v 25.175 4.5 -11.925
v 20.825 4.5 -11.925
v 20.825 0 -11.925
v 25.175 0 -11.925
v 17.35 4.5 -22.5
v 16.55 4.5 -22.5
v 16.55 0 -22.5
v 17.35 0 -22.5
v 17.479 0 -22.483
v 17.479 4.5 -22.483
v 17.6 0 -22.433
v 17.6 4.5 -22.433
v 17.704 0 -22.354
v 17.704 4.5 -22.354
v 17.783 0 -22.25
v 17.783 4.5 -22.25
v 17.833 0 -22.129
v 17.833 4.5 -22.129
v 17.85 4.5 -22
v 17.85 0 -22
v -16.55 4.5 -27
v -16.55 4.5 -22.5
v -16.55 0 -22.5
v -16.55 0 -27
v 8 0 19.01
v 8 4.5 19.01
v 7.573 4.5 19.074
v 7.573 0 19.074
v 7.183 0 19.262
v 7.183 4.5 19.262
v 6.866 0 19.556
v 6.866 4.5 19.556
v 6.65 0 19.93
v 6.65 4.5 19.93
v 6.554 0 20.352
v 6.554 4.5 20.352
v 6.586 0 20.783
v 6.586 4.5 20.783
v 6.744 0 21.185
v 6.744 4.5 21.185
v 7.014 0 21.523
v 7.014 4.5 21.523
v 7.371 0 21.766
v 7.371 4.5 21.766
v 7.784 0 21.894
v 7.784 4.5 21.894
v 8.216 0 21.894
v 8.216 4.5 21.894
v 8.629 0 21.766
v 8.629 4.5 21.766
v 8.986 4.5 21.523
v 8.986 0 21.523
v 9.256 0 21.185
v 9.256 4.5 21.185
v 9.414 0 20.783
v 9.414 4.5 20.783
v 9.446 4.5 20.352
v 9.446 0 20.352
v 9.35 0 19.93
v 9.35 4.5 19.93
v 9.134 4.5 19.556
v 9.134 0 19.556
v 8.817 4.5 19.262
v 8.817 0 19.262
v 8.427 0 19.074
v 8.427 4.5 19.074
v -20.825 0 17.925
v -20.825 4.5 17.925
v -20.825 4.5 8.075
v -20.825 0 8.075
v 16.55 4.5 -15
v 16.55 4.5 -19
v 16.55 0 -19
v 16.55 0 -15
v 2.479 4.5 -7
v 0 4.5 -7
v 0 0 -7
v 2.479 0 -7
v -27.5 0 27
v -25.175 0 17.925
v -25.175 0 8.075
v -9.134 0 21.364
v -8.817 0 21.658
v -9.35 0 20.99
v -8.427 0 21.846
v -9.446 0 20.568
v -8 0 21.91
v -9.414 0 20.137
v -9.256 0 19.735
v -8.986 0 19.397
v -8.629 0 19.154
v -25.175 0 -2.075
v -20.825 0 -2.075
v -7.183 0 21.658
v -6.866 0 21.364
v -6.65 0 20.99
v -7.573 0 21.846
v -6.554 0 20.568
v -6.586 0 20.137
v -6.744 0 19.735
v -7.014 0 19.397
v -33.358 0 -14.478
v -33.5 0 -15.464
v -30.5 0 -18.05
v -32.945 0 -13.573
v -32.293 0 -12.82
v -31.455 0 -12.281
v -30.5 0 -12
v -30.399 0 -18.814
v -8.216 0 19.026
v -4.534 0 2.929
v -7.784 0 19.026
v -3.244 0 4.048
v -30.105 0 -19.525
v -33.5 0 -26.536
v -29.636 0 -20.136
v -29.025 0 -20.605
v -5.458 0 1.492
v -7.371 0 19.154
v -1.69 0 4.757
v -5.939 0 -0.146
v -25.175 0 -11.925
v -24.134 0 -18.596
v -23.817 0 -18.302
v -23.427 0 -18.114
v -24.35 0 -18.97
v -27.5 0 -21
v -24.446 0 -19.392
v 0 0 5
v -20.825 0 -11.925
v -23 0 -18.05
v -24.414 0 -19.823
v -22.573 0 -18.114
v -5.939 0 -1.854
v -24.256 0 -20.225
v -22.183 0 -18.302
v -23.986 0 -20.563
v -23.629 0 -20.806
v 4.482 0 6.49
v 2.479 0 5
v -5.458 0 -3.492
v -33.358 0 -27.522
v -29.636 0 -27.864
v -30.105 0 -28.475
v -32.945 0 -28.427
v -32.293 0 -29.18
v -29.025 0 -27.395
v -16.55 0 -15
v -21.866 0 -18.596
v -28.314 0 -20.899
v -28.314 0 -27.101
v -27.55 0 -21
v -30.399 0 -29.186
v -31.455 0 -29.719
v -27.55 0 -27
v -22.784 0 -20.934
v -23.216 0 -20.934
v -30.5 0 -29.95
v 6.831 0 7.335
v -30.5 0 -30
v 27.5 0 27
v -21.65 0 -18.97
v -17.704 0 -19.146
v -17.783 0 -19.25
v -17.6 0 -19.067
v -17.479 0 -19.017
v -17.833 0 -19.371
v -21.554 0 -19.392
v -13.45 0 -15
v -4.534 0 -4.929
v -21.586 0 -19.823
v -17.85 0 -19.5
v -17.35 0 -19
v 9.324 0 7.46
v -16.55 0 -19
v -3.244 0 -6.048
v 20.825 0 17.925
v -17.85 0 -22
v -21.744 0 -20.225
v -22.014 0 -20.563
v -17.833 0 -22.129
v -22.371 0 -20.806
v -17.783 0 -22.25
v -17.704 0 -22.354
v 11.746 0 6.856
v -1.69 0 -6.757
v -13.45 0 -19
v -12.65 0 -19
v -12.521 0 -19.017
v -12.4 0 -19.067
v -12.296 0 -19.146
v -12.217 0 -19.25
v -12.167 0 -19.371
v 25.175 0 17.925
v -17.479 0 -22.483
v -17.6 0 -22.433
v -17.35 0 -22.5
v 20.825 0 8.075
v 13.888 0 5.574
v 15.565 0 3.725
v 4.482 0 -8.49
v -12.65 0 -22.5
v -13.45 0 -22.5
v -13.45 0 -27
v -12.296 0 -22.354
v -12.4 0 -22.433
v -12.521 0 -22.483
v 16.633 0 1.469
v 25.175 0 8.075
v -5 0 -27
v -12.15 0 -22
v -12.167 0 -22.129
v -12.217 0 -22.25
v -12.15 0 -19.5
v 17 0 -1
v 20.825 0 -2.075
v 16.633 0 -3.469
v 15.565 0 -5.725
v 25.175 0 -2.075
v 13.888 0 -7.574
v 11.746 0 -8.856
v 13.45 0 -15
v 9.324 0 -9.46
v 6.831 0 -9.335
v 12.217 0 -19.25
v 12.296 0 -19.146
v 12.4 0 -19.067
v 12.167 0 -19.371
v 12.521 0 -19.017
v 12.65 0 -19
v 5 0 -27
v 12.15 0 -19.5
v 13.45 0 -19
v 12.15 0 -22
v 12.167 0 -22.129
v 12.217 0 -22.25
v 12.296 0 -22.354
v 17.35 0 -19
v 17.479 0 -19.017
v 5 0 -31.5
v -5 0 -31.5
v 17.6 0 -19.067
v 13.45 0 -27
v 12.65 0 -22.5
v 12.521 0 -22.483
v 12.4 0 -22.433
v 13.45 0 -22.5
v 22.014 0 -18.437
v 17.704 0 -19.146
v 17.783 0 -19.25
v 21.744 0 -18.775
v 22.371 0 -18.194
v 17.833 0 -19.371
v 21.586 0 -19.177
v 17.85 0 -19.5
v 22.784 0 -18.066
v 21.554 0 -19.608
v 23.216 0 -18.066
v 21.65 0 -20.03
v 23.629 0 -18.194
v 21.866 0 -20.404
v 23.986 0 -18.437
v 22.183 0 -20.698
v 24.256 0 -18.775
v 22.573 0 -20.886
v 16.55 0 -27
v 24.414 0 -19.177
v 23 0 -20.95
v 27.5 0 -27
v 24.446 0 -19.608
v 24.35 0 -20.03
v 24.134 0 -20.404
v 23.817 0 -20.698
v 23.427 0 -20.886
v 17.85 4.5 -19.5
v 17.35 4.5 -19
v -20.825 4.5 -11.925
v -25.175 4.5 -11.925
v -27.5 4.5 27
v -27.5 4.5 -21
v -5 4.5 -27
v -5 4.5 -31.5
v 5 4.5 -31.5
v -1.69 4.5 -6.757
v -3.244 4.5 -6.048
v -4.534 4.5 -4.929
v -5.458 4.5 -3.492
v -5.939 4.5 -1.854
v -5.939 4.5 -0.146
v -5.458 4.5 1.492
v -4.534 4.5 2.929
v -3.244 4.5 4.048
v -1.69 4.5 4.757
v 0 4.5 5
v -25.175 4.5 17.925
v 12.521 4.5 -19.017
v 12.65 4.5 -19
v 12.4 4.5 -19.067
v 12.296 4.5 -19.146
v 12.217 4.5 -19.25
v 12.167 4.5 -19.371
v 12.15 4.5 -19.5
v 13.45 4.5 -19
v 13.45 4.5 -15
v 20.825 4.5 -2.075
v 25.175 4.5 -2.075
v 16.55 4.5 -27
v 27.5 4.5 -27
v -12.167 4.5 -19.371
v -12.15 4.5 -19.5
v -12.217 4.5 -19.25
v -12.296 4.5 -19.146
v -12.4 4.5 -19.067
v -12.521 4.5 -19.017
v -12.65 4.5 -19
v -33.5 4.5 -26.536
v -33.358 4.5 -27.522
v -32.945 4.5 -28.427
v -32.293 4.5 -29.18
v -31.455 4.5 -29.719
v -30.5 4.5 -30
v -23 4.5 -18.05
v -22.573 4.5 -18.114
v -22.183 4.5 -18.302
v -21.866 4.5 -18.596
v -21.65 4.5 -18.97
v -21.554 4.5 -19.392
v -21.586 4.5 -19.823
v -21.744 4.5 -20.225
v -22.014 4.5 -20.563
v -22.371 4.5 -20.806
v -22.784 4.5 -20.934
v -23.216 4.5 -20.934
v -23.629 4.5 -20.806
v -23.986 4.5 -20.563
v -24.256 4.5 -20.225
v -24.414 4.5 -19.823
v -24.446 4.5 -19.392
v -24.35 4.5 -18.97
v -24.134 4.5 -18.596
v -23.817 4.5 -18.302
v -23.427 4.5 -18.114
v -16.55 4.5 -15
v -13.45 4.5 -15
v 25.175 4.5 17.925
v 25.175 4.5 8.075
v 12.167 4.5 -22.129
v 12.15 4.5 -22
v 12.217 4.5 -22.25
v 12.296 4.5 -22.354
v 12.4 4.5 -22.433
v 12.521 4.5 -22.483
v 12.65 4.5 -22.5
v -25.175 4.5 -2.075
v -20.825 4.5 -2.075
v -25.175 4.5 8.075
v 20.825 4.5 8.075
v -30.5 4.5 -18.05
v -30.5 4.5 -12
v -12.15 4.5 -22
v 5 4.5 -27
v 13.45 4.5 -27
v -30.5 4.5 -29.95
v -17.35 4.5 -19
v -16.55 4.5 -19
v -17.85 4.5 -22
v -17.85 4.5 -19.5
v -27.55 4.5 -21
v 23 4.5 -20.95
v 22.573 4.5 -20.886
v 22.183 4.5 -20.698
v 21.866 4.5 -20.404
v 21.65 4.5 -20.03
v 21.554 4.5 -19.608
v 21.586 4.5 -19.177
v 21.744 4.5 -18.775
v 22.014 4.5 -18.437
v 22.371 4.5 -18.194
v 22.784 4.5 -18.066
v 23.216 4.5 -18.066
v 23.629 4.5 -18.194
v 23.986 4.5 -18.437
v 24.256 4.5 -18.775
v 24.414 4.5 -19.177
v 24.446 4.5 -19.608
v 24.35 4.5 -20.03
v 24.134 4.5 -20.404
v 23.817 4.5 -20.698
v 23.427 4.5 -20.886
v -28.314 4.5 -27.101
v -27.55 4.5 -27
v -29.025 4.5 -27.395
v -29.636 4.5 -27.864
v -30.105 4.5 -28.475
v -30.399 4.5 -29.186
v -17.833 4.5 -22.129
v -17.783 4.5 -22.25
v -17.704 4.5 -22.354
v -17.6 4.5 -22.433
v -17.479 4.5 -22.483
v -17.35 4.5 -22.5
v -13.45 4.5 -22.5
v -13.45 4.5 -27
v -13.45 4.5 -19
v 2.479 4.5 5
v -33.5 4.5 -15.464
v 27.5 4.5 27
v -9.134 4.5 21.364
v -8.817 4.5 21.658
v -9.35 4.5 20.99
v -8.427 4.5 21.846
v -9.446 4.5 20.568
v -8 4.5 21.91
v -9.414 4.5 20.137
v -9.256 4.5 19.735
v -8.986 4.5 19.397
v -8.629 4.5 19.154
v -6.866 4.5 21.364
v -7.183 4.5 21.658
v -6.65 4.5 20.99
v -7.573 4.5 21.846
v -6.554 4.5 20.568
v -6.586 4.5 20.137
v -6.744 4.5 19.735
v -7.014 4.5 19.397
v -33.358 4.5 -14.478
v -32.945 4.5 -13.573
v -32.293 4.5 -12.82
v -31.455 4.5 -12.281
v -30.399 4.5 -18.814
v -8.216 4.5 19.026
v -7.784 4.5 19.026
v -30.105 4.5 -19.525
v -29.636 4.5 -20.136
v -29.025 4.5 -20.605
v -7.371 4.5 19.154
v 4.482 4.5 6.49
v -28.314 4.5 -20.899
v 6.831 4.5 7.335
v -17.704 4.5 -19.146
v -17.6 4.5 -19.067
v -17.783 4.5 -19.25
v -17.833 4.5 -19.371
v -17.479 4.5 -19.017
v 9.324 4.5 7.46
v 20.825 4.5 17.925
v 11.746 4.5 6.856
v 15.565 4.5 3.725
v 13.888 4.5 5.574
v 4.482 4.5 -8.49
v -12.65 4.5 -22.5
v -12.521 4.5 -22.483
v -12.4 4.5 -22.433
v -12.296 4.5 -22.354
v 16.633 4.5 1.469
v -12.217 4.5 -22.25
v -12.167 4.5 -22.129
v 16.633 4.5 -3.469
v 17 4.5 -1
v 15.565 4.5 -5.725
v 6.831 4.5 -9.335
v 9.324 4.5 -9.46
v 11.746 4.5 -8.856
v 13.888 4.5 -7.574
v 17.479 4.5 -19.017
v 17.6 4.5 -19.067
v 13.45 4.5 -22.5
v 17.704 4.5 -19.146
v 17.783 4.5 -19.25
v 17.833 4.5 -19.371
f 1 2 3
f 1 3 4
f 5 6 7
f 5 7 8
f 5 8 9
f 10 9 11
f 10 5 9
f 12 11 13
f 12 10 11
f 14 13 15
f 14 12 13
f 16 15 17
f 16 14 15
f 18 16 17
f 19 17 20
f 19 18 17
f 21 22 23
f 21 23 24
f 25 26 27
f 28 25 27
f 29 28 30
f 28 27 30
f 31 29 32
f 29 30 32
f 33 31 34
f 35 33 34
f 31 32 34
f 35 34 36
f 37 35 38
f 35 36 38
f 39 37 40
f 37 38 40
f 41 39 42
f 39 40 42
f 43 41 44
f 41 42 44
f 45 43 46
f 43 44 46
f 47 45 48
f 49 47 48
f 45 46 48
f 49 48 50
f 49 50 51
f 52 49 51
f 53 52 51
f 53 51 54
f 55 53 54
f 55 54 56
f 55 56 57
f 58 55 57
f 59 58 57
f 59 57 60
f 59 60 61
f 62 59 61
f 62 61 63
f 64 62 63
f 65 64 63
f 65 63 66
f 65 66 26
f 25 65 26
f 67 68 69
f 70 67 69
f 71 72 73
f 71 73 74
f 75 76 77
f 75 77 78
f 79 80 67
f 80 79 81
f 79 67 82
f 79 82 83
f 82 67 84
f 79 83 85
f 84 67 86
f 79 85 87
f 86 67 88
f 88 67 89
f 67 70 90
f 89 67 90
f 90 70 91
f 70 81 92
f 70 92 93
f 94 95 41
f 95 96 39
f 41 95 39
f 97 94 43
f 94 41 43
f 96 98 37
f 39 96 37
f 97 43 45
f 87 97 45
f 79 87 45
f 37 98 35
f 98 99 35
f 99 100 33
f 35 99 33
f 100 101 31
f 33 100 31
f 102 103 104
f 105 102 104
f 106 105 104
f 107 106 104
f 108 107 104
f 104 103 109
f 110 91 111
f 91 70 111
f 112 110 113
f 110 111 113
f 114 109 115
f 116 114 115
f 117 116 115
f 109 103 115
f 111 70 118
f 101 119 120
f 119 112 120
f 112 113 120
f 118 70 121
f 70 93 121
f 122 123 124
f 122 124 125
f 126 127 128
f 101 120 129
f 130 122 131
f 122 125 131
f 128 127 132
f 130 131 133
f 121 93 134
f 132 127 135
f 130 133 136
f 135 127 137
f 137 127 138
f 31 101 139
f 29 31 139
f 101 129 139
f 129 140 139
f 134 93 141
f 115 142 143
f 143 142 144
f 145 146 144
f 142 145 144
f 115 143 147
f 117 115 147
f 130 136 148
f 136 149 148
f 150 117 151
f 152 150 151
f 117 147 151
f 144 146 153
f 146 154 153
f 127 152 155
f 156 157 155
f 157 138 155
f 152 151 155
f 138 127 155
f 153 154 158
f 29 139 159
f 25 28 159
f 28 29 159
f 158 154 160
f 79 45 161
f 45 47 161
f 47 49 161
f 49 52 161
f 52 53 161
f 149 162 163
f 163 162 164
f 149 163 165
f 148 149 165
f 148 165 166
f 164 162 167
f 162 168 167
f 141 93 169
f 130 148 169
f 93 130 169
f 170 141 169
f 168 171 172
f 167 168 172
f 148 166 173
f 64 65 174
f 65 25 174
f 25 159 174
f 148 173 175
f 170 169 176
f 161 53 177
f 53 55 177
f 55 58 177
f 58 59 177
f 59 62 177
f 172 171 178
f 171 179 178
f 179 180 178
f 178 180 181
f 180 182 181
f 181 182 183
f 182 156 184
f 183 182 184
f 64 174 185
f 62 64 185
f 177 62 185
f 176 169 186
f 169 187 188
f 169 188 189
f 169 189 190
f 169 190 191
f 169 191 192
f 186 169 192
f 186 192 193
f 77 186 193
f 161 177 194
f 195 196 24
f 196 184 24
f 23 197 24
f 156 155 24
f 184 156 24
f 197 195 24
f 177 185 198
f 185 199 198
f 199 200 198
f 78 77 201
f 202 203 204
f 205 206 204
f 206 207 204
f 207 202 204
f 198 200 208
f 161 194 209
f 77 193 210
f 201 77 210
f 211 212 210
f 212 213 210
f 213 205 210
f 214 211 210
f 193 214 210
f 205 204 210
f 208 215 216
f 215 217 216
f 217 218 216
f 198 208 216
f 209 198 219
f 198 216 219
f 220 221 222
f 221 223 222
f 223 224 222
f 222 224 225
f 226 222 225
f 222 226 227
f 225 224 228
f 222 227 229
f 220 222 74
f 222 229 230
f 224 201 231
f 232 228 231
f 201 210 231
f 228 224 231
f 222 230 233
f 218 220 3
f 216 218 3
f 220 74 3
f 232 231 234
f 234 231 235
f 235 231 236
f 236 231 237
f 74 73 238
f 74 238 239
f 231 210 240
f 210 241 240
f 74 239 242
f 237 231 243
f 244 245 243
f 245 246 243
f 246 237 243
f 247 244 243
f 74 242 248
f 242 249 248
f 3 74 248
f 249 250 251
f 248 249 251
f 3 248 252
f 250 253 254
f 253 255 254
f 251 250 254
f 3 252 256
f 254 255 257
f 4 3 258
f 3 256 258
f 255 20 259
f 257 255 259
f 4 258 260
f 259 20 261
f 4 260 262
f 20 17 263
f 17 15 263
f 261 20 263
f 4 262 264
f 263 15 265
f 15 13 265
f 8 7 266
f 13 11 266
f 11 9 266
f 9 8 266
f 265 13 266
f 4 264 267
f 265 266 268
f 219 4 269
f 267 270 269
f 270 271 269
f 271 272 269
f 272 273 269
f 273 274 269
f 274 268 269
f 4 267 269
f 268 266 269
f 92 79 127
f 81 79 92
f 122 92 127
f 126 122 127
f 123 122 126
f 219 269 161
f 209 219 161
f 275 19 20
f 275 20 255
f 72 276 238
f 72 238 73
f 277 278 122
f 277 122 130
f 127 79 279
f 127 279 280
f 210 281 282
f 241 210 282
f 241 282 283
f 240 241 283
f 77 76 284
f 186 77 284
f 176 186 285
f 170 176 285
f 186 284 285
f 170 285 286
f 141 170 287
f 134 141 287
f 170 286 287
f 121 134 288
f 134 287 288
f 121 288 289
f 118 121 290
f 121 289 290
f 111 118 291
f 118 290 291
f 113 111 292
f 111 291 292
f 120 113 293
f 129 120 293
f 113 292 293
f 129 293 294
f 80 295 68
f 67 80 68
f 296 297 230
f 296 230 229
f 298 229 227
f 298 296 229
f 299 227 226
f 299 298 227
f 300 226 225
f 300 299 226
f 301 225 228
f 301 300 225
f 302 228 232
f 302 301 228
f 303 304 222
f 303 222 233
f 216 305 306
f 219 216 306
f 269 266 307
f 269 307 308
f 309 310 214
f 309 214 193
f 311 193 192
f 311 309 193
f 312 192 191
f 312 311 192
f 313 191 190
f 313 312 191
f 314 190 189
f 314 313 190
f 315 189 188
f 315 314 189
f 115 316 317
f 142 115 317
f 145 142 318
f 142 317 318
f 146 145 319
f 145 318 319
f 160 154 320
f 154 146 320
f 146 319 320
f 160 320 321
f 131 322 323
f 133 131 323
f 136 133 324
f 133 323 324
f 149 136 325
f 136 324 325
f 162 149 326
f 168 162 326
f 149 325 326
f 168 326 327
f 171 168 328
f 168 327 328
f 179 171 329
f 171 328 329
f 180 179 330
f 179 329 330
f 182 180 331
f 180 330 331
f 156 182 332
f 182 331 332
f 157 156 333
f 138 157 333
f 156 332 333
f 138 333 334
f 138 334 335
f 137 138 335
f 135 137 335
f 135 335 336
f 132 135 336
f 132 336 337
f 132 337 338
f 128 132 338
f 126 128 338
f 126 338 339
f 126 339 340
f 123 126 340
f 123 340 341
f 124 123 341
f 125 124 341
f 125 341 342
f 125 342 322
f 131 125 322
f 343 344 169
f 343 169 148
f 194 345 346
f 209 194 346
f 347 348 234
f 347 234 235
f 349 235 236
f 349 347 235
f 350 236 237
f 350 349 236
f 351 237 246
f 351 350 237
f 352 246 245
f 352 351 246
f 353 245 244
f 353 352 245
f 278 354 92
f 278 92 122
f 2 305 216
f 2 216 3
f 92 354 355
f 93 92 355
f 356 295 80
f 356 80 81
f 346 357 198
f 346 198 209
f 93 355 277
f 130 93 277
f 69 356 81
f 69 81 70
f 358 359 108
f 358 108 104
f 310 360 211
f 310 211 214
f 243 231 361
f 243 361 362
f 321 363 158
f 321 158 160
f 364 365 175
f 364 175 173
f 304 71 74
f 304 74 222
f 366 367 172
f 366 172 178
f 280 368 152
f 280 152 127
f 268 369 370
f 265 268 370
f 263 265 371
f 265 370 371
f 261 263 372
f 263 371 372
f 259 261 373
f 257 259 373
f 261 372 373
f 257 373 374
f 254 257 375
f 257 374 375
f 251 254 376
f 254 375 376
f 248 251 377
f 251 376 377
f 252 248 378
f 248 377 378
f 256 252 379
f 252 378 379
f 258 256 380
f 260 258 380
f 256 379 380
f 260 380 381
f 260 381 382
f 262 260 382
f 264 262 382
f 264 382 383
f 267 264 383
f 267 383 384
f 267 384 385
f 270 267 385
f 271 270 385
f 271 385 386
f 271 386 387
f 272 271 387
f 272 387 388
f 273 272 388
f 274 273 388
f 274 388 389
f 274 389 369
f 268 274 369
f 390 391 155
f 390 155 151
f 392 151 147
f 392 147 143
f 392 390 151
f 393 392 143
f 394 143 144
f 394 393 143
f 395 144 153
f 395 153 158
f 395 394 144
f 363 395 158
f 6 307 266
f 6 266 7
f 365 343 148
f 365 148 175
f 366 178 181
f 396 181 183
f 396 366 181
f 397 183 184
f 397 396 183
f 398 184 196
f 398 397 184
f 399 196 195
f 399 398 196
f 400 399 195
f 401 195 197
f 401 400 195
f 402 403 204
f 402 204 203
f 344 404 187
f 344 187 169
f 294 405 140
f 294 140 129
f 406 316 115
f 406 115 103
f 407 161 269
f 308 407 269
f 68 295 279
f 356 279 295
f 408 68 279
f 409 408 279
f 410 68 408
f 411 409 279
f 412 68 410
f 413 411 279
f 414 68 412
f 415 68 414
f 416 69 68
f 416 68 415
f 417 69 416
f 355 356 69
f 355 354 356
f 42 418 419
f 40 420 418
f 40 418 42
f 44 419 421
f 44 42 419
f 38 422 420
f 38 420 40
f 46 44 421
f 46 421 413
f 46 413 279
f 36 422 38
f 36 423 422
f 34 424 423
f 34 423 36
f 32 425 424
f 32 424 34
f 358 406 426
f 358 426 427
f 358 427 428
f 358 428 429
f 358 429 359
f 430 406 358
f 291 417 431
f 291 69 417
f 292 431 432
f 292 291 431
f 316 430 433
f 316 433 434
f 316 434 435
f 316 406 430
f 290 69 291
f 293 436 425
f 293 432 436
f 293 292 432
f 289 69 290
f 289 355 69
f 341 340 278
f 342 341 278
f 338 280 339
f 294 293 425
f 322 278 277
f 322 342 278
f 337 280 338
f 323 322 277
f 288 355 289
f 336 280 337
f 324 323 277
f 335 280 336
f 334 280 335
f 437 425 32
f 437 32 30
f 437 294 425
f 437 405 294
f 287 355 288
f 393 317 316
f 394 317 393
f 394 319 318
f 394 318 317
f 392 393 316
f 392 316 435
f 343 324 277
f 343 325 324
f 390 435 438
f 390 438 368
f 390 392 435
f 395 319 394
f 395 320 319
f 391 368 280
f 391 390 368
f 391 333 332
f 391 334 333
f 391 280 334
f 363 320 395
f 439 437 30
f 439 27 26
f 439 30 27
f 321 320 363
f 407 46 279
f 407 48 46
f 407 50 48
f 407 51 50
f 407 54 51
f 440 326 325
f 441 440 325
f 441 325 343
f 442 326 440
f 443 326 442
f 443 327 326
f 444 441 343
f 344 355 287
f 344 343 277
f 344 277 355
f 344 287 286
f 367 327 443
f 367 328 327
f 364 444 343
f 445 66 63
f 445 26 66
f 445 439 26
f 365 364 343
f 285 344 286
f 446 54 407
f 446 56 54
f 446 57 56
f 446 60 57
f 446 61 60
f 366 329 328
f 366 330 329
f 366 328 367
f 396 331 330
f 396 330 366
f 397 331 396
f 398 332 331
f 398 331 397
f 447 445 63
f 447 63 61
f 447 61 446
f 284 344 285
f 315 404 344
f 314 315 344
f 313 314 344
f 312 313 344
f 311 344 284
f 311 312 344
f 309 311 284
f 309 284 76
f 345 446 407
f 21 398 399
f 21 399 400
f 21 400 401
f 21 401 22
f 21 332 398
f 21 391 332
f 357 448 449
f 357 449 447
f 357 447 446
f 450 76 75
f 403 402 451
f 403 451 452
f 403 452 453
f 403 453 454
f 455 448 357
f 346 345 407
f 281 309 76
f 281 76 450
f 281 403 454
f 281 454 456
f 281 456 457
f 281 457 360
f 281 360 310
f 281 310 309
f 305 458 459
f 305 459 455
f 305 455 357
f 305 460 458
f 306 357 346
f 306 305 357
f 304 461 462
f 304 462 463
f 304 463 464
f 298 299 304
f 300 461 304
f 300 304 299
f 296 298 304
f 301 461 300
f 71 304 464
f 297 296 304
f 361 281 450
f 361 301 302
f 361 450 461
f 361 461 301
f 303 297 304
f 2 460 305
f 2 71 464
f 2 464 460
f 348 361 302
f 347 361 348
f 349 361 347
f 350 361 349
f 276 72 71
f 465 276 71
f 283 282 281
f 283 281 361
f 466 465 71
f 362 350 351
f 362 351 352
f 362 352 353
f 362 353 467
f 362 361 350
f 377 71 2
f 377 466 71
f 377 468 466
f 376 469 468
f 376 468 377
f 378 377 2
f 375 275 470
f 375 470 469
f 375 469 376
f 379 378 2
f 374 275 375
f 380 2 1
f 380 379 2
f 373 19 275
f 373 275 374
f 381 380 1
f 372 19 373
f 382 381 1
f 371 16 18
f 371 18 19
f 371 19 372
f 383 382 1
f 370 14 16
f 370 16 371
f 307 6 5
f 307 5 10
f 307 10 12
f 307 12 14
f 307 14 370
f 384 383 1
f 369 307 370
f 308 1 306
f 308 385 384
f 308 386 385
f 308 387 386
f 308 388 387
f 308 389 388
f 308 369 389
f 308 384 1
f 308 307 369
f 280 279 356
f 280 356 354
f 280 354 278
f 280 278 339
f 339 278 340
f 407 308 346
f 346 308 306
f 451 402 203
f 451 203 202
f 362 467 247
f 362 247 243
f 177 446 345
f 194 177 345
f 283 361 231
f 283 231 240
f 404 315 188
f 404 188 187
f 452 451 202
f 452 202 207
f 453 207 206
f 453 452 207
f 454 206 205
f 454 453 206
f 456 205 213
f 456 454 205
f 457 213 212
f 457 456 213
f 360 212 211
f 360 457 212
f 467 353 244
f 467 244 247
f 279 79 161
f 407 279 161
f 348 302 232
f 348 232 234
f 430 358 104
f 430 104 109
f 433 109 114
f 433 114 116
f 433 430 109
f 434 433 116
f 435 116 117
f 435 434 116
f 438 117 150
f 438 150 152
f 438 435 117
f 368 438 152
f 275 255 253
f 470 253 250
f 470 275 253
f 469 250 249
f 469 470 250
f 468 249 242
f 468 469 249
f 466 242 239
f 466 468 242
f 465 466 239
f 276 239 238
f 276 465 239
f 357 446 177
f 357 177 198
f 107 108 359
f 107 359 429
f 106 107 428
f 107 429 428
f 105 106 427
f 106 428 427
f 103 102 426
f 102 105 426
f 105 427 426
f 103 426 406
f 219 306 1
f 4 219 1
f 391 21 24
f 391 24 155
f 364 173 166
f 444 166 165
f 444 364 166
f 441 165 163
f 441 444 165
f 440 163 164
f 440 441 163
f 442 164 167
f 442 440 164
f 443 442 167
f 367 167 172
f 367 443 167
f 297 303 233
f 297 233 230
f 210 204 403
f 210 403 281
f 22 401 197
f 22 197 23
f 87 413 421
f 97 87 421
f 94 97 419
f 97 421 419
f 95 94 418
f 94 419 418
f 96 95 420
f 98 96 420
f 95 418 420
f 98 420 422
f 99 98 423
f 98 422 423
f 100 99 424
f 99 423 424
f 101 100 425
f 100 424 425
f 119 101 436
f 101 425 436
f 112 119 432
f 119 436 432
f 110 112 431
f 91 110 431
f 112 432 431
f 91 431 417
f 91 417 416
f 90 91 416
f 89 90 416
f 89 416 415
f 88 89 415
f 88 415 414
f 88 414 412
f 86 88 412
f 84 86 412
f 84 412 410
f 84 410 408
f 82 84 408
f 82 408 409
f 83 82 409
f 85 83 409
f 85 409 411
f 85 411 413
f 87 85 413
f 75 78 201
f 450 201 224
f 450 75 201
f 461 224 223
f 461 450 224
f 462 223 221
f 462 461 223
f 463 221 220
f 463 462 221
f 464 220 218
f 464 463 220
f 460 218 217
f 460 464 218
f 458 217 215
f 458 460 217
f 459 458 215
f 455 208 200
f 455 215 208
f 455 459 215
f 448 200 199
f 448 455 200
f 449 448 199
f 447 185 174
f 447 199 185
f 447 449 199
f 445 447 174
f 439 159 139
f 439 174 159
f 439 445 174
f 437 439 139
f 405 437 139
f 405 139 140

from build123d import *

# Parameters (mm, degrees)
SKETCH1_W           = 55
SKETCH1_H           = 54
MAINSHAPE_DEPTH     = 4.5
SKETCH2_W           = 10
SKETCH2_H           = 9
TAB1_DEPTH          = 4.5
CUT_EXTRUDE2_DEPTH  = 43.056509603
SKETCH5_W           = 4.35
SKETCH5_H           = 9.85
CUT_EXTRUDE3_DEPTH  = 43.056509603
SKETCH6_R           = 12
CUT_EXTRUDE4_DEPTH  = 43.056509603
SKETCH8_R           = 1.45
CUT_EXTRUDE6_DEPTH  = 43.056509603
SKETCH11_R          = 1.45
CUT_EXTRUDE8_DEPTH  = 43.056509603
SKETCH15_R          = 12
SKETCH15_R_2        = 6
BOSS_EXTRUDE2_DEPTH = 4.5
CUT_EXTRUDE10_DEPTH = 43.056509603
BOSS_EXTRUDE3_DEPTH = 4.5
FILLET1_R           = 3.5


with BuildPart() as part:
    # Sketch1 → MainShape (new body)
    with BuildSketch(Plane(origin=(0, 0, 0), x_dir=(1, 0, 0), z_dir=(0, 1, 0))):
        Rectangle(SKETCH1_W, SKETCH1_H)
    extrude(amount=MAINSHAPE_DEPTH)

    # Sketch2 → Tab1 (add, through all)
    with BuildSketch(Plane(origin=(0, 4.5, 0), x_dir=(1, 0, 0), z_dir=(0, 1, 0))):
        with Locations((0, 27)):
            Rectangle(SKETCH2_W, SKETCH2_H)
    extrude(amount=-TAB1_DEPTH)

    # Sketch4 → Cut-Extrude2 (cut, through all)
    with BuildSketch(Plane(origin=(0, 4.5, 0), x_dir=(1, 0, 0), z_dir=(0, 1, 0))):
        with BuildLine():
            Line((-13.45, 15), (-16.55, 15))
            Line((-16.55, 15), (-16.55, 19))
            Line((-16.55, 19), (-17.35, 19))
            ThreePointArc((-17.35, 19), (-17.703553391, 19.146446609), (-17.85, 19.5))
            Line((-17.85, 19.5), (-17.85, 22))
            ThreePointArc((-17.85, 22), (-17.703553391, 22.353553391), (-17.35, 22.5))
            Line((-17.35, 22.5), (-16.55, 22.5))
            Line((-16.55, 22.5), (-16.55, 27))
            Line((-16.55, 27), (-13.45, 27))
            Line((-13.45, 27), (-13.45, 22.5))
            Line((-13.45, 22.5), (-12.65, 22.5))
            ThreePointArc((-12.65, 22.5), (-12.296446609, 22.353553391), (-12.15, 22))
            Line((-12.15, 22), (-12.15, 19.5))
            ThreePointArc((-12.15, 19.5), (-12.296446609, 19.146446609), (-12.65, 19))
            Line((-12.65, 19), (-13.45, 19))
            Line((-13.45, 19), (-13.45, 15))
        make_face()
        with BuildLine():
            Line((13.45, 15), (13.45, 19))
            Line((13.45, 19), (12.65, 19))
            ThreePointArc((12.65, 19), (12.296446609, 19.146446609), (12.15, 19.5))
            Line((12.15, 19.5), (12.15, 22))
            ThreePointArc((12.15, 22), (12.296446609, 22.353553391), (12.65, 22.5))
            Line((12.65, 22.5), (13.45, 22.5))
            Line((13.45, 22.5), (13.45, 27))
            Line((13.45, 27), (16.55, 27))
            Line((16.55, 27), (16.55, 22.5))
            Line((16.55, 22.5), (17.35, 22.5))
            ThreePointArc((17.35, 22.5), (17.703553391, 22.353553391), (17.85, 22))
            Line((17.85, 22), (17.85, 19.5))
            ThreePointArc((17.85, 19.5), (17.703553391, 19.146446609), (17.35, 19))
            Line((17.35, 19), (16.55, 19))
            Line((16.55, 19), (16.55, 15))
            Line((16.55, 15), (13.45, 15))
        make_face()
    extrude(amount=-CUT_EXTRUDE2_DEPTH, mode=Mode.SUBTRACT)

    # Sketch5 → Cut-Extrude3 (cut, through all)
    with BuildSketch(Plane(origin=(0, 4.5, 0), x_dir=(1, 0, 0), z_dir=(0, 1, 0))):
        with Locations((23, 7)):
            Rectangle(SKETCH5_W, SKETCH5_H)
        with Locations((-23, 7)):
            Rectangle(SKETCH5_W, SKETCH5_H)
        with Locations((-23, -13)):
            Rectangle(SKETCH5_W, SKETCH5_H)
        with Locations((23, -13)):
            Rectangle(SKETCH5_W, SKETCH5_H)
    extrude(amount=-CUT_EXTRUDE3_DEPTH, mode=Mode.SUBTRACT)

    # Sketch6 → Cut-Extrude4 (cut, through all)
    with BuildSketch(Plane(origin=(0, 4.5, 0), x_dir=(1, 0, 0), z_dir=(0, 1, 0))):
        with Locations(Location((0, 1, 0), (0, 0, 270))):
            Circle(SKETCH6_R)
    extrude(amount=-CUT_EXTRUDE4_DEPTH, mode=Mode.SUBTRACT)

    # Sketch8 → Cut-Extrude6 (cut, through all)
    with BuildSketch(Plane(origin=(0, 4.5, 0), x_dir=(1, 0, 0), z_dir=(0, 1, 0))):
        with Locations(Location((-8, -20.46, 0), (0, 0, 270))):
            Circle(SKETCH8_R)
        with Locations(Location((8, -20.46, 0), (0, 0, 90))):
            Circle(SKETCH8_R)
    extrude(amount=-CUT_EXTRUDE6_DEPTH, mode=Mode.SUBTRACT)

    # Sketch11 → Cut-Extrude8 (cut, through all)
    with BuildSketch(Plane(origin=(0, 4.5, 0), x_dir=(1, 0, 0), z_dir=(0, 1, 0))):
        with Locations(Location((-23, 19.5, 0), (0, 0, 270))):
            Circle(SKETCH11_R)
        with Locations(Location((23, 19.5, 0), (0, 0, 90))):
            Circle(SKETCH11_R)
    extrude(amount=-CUT_EXTRUDE8_DEPTH, mode=Mode.SUBTRACT)

    # Sketch15 → Boss-Extrude2 (add, through all)
    with BuildSketch(Plane(origin=(0, 4.5, 0), x_dir=(1, 0, 0), z_dir=(0, 1, 0))):
        with Locations((0, 1)):
            Circle(SKETCH15_R)
        with Locations(Location((0, 1, 0), (0, 0, 270))):
            Circle(SKETCH15_R_2, mode=Mode.SUBTRACT)
    extrude(amount=-BOSS_EXTRUDE2_DEPTH)

    # Sketch16 → Cut-Extrude10 (cut, through all)
    with BuildSketch(Plane(origin=(0, 4.5, 0), x_dir=(1, 0, 0), z_dir=(0, 1, 0))):
        with BuildLine():
            Line((0, 7), (2.479202711, 7))
            ThreePointArc((2.479202711, 7), (17, 1), (2.479202711, -5))
            Line((2.479202711, -5), (0, -5))
            Line((0, -5), (0, 7))
        make_face()
    extrude(amount=-CUT_EXTRUDE10_DEPTH, mode=Mode.SUBTRACT)

    # Sketch18 → Boss-Extrude3 (add, through all)
    with BuildSketch(Plane(origin=(0, 4.5, 0), x_dir=(1, 0, 0), z_dir=(0, 1, 0))):
        with BuildLine():
            Line((-27.5, 27), (-27.55, 27))
            ThreePointArc((-27.55, 27), (-29.635965005, 27.864034995), (-30.5, 29.95))
            Line((-30.5, 29.95), (-30.5, 30))
            Line((-30.5, 30), (-33.5, 30))
            Line((-33.5, 30), (-33.5, 12))
            Line((-33.5, 12), (-30.5, 12))
            Line((-30.5, 12), (-30.5, 18.05))
            ThreePointArc((-30.5, 18.05), (-29.635965005, 20.135965005), (-27.55, 21))
            Line((-27.55, 21), (-27.5, 21))
            Line((-27.5, 21), (-27.5, 27))
        make_face()
    extrude(amount=-BOSS_EXTRUDE3_DEPTH)

    # Fillet1
    # the kernel refuses this fillet: 3.5 mm, written as the material it takes off along each edge
    with BuildSketch(Plane(origin=(-33.5, 13.160254038, -30), x_dir=(0, 0, 1), z_dir=(0, -1, 0))) as fillet1_piece_1:
        with BuildLine():
            CenterArc((3.464101615, -3.5), FILLET1_R, 90, 81.786789298)
            Line((0, -3), (-0.069282032, -2.99))
            ThreePointArc((-0.069282032, -2.99), (-0.07, -1.5), (-0.07, 0))
            Line((-0.07, 0), (0, 0.07))
            Line((0, 0.07), (3.464101615, 0.07))
            Line((3.464101615, 0.07), (3.464101615, 0))
        make_face()
    extrude(amount=21.820508076, mode=Mode.SUBTRACT)
    with BuildSketch(Plane(origin=(-33.5, 13.160254038, -12), x_dir=(1, 0, 0), z_dir=(0, -1, 0))) as fillet1_piece_2:
        with BuildLine():
            CenterArc((3.5, -3.464101615), FILLET1_R, 98.213210702, 81.786789298)
            Line((0, -3.464101615), (-0.07, -3.464101615))
            Line((-0.07, -3.464101615), (-0.07, 0))
            Line((-0.07, 0), (0, 0.07))
            ThreePointArc((0, 0.07), (1.5, 0.07), (2.99, 0.069282032))
            Line((2.99, 0.069282032), (3, 0))
        make_face()
    extrude(amount=21.820508076, mode=Mode.SUBTRACT)


solid = part.part
